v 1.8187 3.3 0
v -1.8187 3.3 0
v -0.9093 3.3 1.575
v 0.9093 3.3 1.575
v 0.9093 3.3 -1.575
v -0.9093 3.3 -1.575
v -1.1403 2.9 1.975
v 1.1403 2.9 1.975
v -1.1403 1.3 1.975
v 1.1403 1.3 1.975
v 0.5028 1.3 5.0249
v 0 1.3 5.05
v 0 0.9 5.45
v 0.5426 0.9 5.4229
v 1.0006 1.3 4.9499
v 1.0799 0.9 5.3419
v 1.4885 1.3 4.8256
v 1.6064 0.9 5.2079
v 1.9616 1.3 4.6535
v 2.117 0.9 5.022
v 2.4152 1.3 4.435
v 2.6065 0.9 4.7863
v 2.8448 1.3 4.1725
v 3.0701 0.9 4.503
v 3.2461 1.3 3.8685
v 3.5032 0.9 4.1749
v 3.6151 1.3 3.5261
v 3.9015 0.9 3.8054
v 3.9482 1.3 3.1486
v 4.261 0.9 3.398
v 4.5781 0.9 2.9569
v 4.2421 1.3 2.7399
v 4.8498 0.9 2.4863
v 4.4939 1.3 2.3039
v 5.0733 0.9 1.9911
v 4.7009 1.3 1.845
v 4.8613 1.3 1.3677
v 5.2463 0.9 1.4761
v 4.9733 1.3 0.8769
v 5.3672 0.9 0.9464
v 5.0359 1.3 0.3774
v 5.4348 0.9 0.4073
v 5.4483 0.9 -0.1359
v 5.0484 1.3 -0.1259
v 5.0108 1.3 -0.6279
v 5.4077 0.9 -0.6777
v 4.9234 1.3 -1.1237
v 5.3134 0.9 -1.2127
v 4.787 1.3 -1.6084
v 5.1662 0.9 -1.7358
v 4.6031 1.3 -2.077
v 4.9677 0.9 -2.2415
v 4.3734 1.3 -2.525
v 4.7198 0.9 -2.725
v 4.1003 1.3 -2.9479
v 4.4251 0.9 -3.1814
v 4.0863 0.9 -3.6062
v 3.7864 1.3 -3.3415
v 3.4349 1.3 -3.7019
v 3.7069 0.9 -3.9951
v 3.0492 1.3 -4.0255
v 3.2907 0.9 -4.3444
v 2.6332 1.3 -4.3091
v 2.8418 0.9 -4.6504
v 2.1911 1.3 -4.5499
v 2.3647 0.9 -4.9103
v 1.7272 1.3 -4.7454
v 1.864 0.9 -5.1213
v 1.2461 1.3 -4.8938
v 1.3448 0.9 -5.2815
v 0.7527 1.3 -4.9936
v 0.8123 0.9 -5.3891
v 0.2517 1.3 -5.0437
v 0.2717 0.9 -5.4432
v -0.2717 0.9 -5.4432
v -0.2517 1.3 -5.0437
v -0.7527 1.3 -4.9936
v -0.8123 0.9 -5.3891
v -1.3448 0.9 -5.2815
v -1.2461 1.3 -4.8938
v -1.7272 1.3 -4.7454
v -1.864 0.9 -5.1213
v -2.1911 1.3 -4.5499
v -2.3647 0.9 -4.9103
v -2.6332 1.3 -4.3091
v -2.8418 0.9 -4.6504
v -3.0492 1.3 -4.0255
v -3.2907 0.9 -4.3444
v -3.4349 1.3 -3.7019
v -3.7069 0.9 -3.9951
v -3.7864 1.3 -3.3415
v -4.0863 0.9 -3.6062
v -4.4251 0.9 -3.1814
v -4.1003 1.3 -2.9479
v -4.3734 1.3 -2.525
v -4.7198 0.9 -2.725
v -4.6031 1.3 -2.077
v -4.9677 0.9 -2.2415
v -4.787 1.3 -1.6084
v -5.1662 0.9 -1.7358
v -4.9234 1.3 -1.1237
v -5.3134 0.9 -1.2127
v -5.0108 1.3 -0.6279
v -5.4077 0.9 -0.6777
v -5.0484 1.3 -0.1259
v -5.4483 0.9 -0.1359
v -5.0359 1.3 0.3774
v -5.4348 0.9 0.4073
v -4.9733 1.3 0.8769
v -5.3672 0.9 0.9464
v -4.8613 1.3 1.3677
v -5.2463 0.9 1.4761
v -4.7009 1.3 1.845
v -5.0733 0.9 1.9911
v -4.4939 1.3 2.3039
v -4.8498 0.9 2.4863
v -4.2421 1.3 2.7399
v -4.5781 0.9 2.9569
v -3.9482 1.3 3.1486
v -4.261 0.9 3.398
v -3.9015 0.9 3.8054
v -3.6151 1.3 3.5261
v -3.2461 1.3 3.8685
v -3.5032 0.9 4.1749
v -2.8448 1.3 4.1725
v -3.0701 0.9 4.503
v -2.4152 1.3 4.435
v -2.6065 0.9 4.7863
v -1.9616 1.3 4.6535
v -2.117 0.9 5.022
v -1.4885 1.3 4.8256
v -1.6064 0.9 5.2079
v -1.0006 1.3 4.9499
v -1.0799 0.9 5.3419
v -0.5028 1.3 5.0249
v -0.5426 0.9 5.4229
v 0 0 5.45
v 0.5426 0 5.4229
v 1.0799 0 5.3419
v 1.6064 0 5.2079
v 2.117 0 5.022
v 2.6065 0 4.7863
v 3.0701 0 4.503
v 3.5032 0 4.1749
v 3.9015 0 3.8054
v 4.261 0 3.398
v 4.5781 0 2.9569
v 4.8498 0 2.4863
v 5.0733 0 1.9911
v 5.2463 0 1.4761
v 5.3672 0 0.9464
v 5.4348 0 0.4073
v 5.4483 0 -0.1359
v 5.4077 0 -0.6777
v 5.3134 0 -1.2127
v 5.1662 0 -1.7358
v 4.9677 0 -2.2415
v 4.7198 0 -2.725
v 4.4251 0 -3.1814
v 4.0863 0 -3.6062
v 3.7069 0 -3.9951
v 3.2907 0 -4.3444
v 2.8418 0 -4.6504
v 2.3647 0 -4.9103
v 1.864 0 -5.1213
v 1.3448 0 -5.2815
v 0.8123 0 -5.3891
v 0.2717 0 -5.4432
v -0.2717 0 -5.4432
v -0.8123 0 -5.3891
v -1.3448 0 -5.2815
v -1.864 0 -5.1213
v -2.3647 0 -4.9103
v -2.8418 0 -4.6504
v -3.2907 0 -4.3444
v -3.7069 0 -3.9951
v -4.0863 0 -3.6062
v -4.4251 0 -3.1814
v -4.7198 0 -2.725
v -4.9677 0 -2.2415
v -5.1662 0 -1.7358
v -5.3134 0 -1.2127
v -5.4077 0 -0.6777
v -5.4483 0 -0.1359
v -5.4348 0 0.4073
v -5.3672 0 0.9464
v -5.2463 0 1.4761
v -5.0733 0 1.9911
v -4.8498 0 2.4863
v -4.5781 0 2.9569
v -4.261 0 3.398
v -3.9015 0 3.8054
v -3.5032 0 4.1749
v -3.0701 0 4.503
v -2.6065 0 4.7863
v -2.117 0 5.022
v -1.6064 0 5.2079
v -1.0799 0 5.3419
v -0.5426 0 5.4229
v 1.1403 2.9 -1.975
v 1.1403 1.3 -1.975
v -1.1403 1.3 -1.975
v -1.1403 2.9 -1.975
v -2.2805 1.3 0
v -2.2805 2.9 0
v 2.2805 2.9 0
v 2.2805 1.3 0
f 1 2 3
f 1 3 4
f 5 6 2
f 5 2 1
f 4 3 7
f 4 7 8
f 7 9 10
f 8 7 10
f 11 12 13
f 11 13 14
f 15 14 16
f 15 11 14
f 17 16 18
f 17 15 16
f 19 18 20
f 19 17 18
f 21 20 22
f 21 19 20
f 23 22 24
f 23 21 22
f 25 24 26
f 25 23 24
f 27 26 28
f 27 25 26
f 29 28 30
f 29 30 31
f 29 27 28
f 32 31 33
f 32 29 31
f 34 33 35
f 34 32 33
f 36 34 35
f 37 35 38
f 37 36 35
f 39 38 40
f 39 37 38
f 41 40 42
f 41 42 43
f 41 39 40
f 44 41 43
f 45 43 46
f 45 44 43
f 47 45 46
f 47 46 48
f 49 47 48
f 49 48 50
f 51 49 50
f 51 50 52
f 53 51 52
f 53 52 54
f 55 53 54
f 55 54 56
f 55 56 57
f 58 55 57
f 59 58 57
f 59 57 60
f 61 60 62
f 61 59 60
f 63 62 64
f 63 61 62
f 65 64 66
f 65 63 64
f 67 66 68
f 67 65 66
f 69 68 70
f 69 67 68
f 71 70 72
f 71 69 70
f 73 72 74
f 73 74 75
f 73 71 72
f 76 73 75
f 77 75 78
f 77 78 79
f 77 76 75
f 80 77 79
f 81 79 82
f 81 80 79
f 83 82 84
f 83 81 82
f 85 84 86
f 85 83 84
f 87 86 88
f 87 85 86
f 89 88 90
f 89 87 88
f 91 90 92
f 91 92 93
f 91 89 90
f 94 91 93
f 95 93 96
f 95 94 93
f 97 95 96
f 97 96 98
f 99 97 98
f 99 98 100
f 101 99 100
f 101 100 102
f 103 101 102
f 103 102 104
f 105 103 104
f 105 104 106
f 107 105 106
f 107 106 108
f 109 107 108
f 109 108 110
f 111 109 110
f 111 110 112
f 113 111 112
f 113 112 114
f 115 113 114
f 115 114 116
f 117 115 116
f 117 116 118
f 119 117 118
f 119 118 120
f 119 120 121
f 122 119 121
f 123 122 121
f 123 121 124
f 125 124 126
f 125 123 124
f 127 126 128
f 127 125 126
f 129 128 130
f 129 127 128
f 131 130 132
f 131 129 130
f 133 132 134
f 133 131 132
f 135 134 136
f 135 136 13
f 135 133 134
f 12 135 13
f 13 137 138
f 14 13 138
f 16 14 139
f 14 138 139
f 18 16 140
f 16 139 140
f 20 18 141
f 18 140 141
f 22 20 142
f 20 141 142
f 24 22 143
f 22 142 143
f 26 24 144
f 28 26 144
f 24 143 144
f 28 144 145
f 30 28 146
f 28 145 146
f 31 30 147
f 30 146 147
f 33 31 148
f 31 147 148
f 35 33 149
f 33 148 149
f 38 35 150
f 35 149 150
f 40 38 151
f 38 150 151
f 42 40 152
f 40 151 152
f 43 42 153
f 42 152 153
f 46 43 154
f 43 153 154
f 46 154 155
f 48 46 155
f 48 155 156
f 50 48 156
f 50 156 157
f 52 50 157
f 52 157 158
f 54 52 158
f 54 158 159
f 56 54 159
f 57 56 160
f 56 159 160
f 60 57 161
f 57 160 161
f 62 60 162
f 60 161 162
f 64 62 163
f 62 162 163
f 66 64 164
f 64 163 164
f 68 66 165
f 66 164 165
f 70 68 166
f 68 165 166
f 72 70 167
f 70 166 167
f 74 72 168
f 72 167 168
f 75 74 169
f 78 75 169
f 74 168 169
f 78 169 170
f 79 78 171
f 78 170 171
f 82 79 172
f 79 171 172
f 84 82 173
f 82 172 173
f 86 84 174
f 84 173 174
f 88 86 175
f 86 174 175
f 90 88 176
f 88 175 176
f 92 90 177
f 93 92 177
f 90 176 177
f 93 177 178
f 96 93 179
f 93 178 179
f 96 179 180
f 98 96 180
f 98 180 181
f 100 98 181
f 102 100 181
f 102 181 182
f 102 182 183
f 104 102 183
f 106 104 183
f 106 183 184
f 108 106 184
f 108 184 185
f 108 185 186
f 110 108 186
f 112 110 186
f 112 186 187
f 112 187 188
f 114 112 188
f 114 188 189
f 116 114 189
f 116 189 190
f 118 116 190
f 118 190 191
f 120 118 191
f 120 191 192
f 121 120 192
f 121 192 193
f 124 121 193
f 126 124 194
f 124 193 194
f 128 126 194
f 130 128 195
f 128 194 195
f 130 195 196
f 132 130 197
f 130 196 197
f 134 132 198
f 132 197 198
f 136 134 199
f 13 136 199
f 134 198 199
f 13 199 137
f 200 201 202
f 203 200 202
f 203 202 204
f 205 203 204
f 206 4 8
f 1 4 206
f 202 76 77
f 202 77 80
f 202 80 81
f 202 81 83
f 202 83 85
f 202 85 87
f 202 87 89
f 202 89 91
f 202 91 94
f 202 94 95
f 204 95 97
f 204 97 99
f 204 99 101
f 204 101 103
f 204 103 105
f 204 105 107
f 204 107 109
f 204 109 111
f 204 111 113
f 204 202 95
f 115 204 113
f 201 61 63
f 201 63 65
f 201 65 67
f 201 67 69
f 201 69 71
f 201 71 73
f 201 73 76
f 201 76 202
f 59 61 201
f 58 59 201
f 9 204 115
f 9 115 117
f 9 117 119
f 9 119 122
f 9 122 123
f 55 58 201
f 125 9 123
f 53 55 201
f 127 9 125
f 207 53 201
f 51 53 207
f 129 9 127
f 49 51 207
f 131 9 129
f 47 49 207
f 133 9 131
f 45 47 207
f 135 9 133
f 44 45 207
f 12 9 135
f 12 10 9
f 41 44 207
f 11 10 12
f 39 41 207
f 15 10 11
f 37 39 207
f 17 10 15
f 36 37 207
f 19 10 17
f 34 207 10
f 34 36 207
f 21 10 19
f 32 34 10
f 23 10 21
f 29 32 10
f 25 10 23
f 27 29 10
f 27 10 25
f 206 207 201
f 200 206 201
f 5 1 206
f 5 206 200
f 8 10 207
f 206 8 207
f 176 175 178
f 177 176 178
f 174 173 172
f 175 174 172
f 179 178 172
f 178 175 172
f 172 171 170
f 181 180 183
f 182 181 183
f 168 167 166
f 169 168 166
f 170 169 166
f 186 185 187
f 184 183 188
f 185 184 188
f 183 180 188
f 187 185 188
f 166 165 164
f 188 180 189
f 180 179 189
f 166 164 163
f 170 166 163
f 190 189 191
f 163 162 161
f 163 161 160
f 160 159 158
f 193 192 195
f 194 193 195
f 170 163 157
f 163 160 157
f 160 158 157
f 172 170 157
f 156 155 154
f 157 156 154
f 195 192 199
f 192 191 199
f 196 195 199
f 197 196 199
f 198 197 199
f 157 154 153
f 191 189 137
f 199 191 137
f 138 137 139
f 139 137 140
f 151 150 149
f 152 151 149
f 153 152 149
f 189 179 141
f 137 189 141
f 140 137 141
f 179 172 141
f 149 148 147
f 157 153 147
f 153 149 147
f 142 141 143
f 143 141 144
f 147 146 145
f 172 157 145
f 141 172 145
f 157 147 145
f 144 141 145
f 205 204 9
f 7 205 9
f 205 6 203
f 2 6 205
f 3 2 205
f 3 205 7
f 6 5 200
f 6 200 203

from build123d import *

# Parameters (mm, degrees)
SZKIC1_R                    = 5.45
DODANIE_WYCI_GNI_CIE1_DEPTH = 1.3
DODANIE_WYCI_GNI_CIE2_DEPTH = 2
SFAZOWANIE1_SIZE            = 0.4


with BuildPart() as part:
    # Szkic1 → Dodanie-wyciągnięcie1 (new body)
    with BuildSketch(Plane(origin=(0, 0, 0), x_dir=(1, 0, 0), z_dir=(0, 1, 0))):
        with Locations(Location((0, 0, 0), (0, 0, 270))):
            Circle(SZKIC1_R)
    extrude(amount=DODANIE_WYCI_GNI_CIE1_DEPTH)

    # Szkic2 → Dodanie-wyciągnięcie2 (add)
    with BuildSketch(Plane(origin=(0, 1.3, 0), x_dir=(1, 0, 0), z_dir=(0, 1, 0))):
        Polygon((2.280533563, 0), (1.140266782, 1.975), (-1.140266782, 1.975), (-2.280533563, 0), (-1.140266782, -1.975), (1.140266782, -1.975), align=None)
    extrude(amount=DODANIE_WYCI_GNI_CIE2_DEPTH)

    # Sfazowanie1
    sfazowanie1_edges = [part.edges().sort_by_distance(p)[0] for p in [
        (1.710400172, 3.3, 0.9875),
        (1.710400172, 3.3, -0.9875),
        (0, 3.3, -1.975),
        (-1.710400172, 3.3, -0.9875),
        (-1.710400172, 3.3, 0.9875),
        (0, 3.3, 1.975),
        (0, 1.3, -5.45),
    ]]
    chamfer(sfazowanie1_edges, length=SFAZOWANIE1_SIZE)


solid = part.part
